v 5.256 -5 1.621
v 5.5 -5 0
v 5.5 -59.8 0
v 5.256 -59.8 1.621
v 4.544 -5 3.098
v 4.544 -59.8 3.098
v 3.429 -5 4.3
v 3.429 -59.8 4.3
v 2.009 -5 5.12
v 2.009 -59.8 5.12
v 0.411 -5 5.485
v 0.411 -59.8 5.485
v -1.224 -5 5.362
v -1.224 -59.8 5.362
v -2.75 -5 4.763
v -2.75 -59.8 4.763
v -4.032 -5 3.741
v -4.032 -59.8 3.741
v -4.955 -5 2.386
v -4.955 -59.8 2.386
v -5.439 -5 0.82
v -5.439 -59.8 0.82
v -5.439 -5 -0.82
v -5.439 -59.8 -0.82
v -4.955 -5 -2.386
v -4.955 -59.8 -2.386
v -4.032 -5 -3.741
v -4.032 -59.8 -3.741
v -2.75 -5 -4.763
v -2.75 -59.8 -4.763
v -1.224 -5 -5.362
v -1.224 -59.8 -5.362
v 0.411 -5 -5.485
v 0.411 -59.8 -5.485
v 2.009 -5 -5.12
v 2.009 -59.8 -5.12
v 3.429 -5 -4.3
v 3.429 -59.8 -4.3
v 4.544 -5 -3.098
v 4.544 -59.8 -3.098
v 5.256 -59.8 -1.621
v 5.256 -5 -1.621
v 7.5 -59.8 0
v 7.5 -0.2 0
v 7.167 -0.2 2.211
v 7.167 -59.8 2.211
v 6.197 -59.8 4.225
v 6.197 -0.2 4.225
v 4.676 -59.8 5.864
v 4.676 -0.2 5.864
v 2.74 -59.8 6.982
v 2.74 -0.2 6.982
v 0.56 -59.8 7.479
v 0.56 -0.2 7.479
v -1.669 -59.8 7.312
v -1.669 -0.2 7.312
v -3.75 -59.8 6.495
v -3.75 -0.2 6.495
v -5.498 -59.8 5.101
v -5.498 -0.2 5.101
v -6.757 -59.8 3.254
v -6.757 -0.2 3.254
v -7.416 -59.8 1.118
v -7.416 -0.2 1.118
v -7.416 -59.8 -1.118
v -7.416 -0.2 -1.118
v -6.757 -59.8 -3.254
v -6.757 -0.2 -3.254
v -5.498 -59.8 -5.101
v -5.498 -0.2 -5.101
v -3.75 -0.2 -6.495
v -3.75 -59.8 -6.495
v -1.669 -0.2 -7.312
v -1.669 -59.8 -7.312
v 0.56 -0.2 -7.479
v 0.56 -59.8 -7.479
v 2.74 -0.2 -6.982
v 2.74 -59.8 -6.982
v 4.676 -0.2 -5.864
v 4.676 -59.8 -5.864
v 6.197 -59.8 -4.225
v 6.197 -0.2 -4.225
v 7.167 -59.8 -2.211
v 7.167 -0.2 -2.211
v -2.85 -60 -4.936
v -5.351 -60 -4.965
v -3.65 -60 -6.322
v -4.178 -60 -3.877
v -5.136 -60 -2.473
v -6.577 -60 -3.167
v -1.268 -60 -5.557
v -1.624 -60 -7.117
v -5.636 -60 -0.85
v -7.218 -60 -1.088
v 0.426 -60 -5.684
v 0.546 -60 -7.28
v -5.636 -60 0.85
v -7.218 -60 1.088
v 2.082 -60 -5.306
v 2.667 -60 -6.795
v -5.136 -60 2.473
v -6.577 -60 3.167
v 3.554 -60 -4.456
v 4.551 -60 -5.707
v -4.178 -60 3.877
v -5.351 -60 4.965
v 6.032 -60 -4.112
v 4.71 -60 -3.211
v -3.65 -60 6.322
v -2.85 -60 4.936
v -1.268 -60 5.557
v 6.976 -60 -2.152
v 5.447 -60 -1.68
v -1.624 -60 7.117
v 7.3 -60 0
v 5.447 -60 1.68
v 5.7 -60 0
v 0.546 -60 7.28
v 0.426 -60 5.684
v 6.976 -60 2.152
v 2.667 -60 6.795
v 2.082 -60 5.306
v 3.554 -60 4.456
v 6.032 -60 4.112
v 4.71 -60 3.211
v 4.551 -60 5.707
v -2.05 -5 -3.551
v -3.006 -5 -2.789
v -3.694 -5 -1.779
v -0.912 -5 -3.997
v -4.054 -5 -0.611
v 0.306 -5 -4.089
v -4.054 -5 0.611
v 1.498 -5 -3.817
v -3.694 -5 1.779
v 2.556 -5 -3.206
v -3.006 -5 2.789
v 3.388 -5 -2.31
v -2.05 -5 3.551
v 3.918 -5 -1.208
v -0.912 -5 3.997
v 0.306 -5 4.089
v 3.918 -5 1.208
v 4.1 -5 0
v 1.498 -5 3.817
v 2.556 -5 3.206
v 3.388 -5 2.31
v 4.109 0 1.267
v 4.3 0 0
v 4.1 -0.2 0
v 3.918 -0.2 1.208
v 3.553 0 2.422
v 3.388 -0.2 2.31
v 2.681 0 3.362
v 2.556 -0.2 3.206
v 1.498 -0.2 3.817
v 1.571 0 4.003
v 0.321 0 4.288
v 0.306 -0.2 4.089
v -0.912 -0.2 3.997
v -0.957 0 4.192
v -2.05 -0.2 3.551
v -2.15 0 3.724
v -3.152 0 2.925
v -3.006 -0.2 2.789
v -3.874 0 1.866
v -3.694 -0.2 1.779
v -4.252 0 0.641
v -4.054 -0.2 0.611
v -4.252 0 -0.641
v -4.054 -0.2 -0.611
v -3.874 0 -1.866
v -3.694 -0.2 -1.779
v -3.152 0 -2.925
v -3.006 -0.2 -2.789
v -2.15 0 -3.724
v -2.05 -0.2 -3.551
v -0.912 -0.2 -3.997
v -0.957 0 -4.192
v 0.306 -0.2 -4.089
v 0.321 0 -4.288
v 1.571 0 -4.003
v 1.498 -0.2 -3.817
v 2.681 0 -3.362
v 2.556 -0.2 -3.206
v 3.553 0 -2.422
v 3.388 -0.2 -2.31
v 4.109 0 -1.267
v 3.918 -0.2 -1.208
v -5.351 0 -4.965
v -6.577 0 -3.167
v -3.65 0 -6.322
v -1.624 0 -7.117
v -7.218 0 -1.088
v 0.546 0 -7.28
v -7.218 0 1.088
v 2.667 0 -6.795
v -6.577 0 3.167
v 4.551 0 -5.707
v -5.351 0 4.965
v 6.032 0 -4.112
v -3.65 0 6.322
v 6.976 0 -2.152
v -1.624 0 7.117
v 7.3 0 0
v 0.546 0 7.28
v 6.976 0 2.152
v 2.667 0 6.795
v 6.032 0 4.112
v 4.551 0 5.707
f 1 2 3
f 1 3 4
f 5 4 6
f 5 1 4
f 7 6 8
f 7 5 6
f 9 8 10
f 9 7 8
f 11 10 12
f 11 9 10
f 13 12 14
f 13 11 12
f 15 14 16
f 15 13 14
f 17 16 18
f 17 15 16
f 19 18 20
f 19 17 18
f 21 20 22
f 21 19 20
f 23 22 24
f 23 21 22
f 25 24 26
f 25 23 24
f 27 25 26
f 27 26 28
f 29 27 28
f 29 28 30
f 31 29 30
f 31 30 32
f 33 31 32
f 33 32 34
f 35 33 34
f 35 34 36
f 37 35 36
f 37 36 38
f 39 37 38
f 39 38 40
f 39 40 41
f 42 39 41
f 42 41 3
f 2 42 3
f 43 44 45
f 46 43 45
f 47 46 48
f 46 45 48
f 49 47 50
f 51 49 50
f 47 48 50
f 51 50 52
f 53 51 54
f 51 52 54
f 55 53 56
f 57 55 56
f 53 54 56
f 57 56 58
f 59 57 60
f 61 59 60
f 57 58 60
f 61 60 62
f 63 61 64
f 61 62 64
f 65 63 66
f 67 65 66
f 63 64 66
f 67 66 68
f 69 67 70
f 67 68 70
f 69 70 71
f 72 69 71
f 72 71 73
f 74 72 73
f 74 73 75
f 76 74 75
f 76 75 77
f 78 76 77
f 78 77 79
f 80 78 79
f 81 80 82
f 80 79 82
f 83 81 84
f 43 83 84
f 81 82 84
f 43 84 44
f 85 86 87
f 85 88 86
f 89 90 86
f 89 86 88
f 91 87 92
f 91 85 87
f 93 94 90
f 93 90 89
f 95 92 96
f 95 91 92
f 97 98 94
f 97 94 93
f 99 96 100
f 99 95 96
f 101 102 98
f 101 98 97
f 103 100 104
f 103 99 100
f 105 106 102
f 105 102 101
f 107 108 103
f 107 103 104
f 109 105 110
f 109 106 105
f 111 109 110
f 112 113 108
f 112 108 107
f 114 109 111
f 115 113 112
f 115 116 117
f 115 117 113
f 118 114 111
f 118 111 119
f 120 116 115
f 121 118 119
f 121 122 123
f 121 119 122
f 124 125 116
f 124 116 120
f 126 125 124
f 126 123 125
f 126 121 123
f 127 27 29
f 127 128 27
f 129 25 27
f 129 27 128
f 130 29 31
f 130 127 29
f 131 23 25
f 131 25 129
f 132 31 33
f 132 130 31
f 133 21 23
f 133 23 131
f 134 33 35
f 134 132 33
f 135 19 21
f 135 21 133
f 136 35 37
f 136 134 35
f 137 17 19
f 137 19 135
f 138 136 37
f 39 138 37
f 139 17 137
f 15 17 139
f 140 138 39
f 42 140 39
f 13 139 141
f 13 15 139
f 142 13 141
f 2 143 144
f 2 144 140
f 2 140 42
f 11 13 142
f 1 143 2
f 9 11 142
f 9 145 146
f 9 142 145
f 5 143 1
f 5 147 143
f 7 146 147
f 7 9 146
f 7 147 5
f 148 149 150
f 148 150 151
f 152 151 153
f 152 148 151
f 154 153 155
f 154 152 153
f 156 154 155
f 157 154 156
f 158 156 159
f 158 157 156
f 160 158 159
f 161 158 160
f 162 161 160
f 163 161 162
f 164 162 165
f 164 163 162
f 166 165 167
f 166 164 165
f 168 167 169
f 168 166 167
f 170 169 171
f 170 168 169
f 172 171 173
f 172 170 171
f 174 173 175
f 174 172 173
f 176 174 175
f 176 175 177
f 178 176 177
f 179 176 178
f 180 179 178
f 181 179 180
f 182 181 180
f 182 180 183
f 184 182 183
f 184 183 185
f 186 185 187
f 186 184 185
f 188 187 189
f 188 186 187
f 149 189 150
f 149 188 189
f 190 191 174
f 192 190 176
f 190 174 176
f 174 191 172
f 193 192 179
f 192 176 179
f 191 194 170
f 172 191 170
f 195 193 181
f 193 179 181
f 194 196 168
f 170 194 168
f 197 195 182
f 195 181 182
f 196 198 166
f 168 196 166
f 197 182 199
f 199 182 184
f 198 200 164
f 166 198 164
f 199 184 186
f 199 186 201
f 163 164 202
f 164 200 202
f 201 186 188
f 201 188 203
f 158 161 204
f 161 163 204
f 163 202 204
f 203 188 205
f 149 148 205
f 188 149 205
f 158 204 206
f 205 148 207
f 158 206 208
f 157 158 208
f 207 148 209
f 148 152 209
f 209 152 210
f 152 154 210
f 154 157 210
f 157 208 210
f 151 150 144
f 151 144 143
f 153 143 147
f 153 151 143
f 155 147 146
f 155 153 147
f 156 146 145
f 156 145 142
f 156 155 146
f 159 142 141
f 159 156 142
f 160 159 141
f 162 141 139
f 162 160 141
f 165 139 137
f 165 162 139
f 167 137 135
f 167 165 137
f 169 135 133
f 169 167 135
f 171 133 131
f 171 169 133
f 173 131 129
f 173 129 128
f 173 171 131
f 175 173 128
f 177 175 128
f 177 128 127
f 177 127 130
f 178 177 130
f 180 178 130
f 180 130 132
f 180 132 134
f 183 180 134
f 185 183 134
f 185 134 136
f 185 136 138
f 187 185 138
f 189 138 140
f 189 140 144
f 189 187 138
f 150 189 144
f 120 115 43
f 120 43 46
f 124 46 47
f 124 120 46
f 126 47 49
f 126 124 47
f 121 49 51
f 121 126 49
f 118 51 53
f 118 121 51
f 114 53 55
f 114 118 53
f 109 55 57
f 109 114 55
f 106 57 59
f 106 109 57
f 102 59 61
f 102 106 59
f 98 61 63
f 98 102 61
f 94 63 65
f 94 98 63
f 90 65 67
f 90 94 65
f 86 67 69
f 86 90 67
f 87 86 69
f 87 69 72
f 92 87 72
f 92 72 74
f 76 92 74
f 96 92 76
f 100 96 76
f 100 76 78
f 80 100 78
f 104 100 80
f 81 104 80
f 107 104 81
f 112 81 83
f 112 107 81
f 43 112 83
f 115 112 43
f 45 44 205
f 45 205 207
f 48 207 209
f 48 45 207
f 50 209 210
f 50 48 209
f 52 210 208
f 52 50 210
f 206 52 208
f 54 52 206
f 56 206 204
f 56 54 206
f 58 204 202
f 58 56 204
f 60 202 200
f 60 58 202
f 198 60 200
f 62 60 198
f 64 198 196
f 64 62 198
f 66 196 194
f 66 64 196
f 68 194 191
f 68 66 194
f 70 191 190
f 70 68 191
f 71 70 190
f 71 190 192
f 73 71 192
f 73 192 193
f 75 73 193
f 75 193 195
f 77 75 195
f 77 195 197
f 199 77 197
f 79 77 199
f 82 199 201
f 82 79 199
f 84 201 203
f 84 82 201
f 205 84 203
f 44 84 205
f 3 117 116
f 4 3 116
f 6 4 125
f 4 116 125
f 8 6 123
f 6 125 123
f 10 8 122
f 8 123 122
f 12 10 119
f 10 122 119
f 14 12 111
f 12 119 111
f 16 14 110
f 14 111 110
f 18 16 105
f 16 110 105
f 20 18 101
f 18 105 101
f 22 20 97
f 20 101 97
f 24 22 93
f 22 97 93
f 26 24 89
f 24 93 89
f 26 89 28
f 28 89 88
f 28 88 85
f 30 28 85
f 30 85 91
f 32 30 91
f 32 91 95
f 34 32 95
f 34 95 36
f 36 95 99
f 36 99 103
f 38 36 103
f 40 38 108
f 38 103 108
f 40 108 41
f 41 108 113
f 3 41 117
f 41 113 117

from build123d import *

# Parameters (mm, degrees)
F0_R     = 7.5
F0_R_2   = 5.5
F1_DEPTH = 60
F0_R_3   = 4.1
F2_DEPTH = 5
F3_SIZE  = 0.2


with BuildPart() as f1:
    # F0 (on Front) → F1 (new body)
    with BuildSketch(Plane.XZ):
        Circle(F0_R)
        Circle(F0_R_2, mode=Mode.SUBTRACT)
    extrude(amount=F1_DEPTH)

    # F0 (on Front) → F2 (join)
    with BuildSketch(Plane.XZ):
        Circle(F0_R_2)
        Circle(F0_R_3, mode=Mode.SUBTRACT)
    extrude(amount=F2_DEPTH)

    # F3
    f3_edges = [f1.edges().sort_by_distance(p)[0] for p in [
        (-7.5, 0, 0),
        (-4.1, 0, 0),
        (-7.5, -60, 0),
        (-5.5, -60, 0),
    ]]
    chamfer(f3_edges, length=F3_SIZE)


solid = f1.part
